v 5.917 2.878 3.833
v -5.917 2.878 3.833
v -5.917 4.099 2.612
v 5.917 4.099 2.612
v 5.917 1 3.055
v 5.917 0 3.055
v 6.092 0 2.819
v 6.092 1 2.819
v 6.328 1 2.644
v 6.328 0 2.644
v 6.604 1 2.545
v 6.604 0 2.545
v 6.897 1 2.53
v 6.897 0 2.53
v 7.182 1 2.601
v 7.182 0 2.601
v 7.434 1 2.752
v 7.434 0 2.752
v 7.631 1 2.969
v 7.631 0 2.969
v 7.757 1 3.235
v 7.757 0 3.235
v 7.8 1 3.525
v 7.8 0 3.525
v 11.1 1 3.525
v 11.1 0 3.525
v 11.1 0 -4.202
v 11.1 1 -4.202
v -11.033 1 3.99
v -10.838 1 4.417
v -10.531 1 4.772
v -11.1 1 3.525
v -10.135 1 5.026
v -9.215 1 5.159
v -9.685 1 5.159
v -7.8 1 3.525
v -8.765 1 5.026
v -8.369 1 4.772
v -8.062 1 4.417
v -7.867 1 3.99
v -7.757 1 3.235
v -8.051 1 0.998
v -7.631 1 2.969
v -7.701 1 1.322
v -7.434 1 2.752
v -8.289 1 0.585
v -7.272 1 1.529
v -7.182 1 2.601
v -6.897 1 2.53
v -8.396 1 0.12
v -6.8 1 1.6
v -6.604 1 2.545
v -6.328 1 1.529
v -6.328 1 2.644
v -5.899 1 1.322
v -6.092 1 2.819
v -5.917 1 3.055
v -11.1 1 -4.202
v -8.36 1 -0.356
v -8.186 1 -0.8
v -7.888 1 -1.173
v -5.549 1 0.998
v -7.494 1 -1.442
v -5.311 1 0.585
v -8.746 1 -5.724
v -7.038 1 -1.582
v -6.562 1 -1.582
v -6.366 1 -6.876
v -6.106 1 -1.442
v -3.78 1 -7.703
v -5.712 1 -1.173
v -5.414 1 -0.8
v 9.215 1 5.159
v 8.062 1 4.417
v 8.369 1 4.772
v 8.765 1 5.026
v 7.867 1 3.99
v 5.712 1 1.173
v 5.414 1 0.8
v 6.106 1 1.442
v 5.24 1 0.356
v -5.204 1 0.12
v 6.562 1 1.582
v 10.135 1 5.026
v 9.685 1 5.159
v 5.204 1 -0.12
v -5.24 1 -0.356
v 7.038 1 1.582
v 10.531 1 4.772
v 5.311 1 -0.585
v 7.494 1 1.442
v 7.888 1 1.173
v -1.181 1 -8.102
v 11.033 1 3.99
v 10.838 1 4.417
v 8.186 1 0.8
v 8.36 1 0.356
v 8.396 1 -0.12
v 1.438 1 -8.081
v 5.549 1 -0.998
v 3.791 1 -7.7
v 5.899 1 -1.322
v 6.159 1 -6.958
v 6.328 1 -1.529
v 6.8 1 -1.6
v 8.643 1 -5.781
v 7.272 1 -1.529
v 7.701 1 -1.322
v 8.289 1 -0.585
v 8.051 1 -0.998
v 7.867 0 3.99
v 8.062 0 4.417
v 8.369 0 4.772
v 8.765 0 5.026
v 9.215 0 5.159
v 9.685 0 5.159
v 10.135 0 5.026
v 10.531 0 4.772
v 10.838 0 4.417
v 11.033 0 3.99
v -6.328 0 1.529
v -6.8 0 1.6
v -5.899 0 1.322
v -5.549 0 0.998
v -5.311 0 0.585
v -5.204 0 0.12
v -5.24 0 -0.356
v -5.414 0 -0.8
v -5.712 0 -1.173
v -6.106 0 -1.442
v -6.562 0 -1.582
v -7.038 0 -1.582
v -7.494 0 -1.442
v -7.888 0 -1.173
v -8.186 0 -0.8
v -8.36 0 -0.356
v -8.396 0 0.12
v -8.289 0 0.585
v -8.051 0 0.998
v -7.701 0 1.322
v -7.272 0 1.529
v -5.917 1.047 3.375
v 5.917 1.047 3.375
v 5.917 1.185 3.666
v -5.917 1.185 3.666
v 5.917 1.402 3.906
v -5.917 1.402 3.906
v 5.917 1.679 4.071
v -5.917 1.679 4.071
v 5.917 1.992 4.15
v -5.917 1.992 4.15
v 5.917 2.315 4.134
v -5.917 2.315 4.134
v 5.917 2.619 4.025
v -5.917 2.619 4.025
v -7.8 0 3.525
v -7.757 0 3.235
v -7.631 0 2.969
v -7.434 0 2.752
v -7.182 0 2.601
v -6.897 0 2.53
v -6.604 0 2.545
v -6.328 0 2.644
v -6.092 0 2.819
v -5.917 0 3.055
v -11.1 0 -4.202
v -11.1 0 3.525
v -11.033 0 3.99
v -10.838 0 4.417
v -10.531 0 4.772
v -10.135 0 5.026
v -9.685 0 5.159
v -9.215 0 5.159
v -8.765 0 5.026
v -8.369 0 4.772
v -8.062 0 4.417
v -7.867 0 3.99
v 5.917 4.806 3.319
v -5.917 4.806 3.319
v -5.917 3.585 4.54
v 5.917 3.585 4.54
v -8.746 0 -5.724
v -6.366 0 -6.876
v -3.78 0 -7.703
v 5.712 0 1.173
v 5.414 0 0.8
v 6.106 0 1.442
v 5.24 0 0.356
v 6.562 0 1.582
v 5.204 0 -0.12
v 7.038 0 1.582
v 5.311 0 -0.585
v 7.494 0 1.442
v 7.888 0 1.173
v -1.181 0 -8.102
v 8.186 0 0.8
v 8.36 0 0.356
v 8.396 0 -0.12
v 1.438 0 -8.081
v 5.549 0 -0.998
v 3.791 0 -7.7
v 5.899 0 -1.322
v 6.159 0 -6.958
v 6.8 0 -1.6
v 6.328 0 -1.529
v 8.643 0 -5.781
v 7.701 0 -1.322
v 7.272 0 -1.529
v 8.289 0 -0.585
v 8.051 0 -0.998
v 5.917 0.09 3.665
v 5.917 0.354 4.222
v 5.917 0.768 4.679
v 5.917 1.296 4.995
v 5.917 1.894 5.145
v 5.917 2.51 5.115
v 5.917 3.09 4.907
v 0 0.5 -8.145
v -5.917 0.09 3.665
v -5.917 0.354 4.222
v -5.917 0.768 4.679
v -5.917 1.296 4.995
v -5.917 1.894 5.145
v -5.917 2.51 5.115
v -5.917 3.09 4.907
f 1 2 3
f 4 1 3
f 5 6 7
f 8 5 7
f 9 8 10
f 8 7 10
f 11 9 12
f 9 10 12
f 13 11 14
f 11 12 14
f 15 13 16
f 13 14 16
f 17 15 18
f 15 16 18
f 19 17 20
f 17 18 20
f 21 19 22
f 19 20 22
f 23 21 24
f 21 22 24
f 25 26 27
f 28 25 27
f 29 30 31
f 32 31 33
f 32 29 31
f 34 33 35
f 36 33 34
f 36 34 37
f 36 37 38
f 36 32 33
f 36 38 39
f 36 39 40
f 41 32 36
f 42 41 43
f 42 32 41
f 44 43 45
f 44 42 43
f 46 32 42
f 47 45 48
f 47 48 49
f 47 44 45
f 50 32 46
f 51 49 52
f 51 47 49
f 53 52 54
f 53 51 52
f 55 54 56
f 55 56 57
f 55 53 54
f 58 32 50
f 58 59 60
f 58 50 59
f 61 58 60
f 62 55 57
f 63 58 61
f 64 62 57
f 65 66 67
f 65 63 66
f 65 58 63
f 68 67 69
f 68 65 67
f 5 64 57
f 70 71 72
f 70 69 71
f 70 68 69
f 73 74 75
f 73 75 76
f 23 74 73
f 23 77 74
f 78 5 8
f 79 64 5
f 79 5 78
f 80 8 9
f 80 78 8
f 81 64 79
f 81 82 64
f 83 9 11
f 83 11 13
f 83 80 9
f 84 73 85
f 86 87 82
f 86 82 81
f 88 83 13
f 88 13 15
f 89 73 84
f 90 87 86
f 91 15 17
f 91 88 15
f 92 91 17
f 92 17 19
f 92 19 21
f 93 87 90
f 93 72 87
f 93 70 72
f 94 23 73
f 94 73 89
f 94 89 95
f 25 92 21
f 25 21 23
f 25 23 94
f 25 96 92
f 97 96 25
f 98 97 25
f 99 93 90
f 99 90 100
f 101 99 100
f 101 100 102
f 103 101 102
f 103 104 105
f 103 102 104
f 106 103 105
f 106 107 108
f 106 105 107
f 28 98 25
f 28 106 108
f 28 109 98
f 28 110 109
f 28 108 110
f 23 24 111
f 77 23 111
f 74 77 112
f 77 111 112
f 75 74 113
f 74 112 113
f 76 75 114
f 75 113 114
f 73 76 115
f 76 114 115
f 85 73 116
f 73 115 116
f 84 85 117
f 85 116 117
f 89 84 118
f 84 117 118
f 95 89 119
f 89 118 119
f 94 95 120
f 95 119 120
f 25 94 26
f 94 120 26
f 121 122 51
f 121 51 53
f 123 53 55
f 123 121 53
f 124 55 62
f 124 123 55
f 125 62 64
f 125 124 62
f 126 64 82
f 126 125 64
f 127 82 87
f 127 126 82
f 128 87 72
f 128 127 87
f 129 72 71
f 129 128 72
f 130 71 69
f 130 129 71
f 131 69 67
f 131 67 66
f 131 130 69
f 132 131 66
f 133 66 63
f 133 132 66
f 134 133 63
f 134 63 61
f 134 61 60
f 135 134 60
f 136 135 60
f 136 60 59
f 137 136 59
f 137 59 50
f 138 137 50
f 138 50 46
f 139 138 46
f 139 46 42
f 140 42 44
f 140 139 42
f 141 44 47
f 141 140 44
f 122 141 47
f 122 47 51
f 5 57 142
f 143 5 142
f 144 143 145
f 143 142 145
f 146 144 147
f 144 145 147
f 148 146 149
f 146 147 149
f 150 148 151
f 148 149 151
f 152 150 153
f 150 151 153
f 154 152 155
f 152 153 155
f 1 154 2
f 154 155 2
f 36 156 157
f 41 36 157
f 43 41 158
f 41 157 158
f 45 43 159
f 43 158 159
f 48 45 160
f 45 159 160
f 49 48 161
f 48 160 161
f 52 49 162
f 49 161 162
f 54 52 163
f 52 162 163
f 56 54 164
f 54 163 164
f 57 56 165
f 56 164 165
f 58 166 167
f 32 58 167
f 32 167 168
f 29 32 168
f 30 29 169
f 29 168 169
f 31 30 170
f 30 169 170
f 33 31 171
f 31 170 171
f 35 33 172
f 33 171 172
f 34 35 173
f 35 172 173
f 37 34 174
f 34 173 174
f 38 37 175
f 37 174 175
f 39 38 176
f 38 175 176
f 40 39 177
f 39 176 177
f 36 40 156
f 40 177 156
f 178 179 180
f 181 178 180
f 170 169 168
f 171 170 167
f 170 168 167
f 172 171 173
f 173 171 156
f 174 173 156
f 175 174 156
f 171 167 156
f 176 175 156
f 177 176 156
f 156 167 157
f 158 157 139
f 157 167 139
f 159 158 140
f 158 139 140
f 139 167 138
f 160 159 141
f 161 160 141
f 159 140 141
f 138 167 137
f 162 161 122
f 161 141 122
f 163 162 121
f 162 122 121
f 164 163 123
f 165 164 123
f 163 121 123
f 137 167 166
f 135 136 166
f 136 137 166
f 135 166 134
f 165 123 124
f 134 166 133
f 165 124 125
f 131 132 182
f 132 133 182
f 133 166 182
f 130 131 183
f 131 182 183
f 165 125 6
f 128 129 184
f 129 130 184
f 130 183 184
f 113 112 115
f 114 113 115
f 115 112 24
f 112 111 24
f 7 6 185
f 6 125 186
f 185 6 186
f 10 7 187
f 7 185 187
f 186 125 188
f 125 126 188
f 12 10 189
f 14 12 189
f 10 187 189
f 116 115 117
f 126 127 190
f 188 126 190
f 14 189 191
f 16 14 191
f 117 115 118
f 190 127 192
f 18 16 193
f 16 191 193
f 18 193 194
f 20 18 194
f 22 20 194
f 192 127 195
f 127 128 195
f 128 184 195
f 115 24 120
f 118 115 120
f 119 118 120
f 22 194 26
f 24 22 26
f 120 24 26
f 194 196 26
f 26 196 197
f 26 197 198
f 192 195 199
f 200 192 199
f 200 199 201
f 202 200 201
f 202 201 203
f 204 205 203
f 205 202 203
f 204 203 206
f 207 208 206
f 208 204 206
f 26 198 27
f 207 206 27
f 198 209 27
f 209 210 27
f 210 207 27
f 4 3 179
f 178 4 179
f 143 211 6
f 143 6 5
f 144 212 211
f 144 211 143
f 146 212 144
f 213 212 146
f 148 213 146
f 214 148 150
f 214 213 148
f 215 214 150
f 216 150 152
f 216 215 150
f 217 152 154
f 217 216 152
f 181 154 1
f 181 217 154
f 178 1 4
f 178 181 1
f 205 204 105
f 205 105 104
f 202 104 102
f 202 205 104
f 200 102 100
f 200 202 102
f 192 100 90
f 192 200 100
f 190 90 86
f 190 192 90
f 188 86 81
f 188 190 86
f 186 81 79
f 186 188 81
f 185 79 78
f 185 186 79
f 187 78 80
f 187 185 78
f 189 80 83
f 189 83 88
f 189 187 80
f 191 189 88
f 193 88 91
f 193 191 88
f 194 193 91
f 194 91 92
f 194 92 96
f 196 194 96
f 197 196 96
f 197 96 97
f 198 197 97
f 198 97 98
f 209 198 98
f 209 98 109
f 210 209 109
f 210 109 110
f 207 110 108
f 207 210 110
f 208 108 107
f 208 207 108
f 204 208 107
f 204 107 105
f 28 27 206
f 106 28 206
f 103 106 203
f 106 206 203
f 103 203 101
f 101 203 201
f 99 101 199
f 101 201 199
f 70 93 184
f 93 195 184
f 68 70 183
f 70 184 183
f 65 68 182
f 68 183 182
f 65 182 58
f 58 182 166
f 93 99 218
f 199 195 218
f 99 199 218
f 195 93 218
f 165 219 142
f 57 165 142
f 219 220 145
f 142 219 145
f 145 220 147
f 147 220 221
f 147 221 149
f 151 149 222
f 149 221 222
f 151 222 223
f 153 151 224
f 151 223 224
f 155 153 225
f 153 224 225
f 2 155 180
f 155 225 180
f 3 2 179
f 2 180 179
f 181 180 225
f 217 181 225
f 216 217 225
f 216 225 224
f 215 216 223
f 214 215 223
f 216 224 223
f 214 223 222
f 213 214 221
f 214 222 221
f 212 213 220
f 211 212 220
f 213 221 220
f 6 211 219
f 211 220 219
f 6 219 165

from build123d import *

# Parameters (mm, degrees)
SKETCH1_R           = 1.6
BOSS_EXTRUDE1_DEPTH = 1
THICKEN2_START      = -5.917392258
THICKEN2_DEPTH      = 11.834784516


# Read off the part's stored shape, not the designer's step: Thicken2
with BuildPart() as part:
    # Sketch1 → Boss-Extrude1 (new body)
    with BuildSketch(Plane(origin=(0, 0, 0), x_dir=(1, 0, 0), z_dir=(0, 1, 0))):
        with BuildLine():
            Line((-11.1, 4.202456856), (-11.1, -3.525300194))
            ThreePointArc((-11.1, -3.525300194), (-9.45, -5.175300194), (-7.8, -3.525300194))
            ThreePointArc((-7.8, -3.525300194), (-7.04227284, -2.555092036), (-5.917392258, -3.055190021))
            Line((-5.917392258, -3.055190021), (5.917392258, -3.055190021))
            ThreePointArc((5.917392258, -3.055190021), (7.04227284, -2.555092036), (7.8, -3.525300194))
            ThreePointArc((7.8, -3.525300194), (9.45, -5.175300194), (11.1, -3.525300194))
            Line((11.1, -3.525300194), (11.1, 4.202456856))
            add(Edge.make_bspline(
                [(11.1, 4.202456856), (5.688924475, 8.144809979), (0, 8.144809979)],
                knots=[0, 0, 0, 1, 1, 1], degree=2))
            add(Edge.make_bspline(
                [(-11.1, 4.202456856), (-5.688924475, 8.144809979), (0, 8.144809979)],
                knots=[0, 0, 0, 1, 1, 1], degree=2))
        make_face()
        with Locations(Location((-6.8, 0, 0), (0, 0, 270))):
            Circle(SKETCH1_R, mode=Mode.SUBTRACT)
        with Locations(Location((6.8, 0, 0), (0, 0, 90))):
            Circle(SKETCH1_R, mode=Mode.SUBTRACT)
    extrude(amount=BOSS_EXTRUDE1_DEPTH)

    # Thicken2 outline → Thicken2 (add)
    with BuildSketch(Plane.YZ.offset(THICKEN2_START)):
        with BuildLine():
            Line((2.877817459, 3.833007481), (4.098758354, 2.612066586))
            Line((4.098758354, 2.612066586), (4.805865135, 3.319173367))
            Line((4.805865135, 3.319173367), (3.58492424, 4.540114262))
            ThreePointArc((3.58492424, 4.540114262), (1.296364791, 4.99533704), (0, 3.055190021))
            Line((0, 3.055190021), (1, 3.055190021))
            ThreePointArc((1, 3.055190021), (1.679048224, 4.071457507), (2.877817459, 3.833007481))
        make_face()
    extrude(amount=THICKEN2_DEPTH)


solid = part.part
